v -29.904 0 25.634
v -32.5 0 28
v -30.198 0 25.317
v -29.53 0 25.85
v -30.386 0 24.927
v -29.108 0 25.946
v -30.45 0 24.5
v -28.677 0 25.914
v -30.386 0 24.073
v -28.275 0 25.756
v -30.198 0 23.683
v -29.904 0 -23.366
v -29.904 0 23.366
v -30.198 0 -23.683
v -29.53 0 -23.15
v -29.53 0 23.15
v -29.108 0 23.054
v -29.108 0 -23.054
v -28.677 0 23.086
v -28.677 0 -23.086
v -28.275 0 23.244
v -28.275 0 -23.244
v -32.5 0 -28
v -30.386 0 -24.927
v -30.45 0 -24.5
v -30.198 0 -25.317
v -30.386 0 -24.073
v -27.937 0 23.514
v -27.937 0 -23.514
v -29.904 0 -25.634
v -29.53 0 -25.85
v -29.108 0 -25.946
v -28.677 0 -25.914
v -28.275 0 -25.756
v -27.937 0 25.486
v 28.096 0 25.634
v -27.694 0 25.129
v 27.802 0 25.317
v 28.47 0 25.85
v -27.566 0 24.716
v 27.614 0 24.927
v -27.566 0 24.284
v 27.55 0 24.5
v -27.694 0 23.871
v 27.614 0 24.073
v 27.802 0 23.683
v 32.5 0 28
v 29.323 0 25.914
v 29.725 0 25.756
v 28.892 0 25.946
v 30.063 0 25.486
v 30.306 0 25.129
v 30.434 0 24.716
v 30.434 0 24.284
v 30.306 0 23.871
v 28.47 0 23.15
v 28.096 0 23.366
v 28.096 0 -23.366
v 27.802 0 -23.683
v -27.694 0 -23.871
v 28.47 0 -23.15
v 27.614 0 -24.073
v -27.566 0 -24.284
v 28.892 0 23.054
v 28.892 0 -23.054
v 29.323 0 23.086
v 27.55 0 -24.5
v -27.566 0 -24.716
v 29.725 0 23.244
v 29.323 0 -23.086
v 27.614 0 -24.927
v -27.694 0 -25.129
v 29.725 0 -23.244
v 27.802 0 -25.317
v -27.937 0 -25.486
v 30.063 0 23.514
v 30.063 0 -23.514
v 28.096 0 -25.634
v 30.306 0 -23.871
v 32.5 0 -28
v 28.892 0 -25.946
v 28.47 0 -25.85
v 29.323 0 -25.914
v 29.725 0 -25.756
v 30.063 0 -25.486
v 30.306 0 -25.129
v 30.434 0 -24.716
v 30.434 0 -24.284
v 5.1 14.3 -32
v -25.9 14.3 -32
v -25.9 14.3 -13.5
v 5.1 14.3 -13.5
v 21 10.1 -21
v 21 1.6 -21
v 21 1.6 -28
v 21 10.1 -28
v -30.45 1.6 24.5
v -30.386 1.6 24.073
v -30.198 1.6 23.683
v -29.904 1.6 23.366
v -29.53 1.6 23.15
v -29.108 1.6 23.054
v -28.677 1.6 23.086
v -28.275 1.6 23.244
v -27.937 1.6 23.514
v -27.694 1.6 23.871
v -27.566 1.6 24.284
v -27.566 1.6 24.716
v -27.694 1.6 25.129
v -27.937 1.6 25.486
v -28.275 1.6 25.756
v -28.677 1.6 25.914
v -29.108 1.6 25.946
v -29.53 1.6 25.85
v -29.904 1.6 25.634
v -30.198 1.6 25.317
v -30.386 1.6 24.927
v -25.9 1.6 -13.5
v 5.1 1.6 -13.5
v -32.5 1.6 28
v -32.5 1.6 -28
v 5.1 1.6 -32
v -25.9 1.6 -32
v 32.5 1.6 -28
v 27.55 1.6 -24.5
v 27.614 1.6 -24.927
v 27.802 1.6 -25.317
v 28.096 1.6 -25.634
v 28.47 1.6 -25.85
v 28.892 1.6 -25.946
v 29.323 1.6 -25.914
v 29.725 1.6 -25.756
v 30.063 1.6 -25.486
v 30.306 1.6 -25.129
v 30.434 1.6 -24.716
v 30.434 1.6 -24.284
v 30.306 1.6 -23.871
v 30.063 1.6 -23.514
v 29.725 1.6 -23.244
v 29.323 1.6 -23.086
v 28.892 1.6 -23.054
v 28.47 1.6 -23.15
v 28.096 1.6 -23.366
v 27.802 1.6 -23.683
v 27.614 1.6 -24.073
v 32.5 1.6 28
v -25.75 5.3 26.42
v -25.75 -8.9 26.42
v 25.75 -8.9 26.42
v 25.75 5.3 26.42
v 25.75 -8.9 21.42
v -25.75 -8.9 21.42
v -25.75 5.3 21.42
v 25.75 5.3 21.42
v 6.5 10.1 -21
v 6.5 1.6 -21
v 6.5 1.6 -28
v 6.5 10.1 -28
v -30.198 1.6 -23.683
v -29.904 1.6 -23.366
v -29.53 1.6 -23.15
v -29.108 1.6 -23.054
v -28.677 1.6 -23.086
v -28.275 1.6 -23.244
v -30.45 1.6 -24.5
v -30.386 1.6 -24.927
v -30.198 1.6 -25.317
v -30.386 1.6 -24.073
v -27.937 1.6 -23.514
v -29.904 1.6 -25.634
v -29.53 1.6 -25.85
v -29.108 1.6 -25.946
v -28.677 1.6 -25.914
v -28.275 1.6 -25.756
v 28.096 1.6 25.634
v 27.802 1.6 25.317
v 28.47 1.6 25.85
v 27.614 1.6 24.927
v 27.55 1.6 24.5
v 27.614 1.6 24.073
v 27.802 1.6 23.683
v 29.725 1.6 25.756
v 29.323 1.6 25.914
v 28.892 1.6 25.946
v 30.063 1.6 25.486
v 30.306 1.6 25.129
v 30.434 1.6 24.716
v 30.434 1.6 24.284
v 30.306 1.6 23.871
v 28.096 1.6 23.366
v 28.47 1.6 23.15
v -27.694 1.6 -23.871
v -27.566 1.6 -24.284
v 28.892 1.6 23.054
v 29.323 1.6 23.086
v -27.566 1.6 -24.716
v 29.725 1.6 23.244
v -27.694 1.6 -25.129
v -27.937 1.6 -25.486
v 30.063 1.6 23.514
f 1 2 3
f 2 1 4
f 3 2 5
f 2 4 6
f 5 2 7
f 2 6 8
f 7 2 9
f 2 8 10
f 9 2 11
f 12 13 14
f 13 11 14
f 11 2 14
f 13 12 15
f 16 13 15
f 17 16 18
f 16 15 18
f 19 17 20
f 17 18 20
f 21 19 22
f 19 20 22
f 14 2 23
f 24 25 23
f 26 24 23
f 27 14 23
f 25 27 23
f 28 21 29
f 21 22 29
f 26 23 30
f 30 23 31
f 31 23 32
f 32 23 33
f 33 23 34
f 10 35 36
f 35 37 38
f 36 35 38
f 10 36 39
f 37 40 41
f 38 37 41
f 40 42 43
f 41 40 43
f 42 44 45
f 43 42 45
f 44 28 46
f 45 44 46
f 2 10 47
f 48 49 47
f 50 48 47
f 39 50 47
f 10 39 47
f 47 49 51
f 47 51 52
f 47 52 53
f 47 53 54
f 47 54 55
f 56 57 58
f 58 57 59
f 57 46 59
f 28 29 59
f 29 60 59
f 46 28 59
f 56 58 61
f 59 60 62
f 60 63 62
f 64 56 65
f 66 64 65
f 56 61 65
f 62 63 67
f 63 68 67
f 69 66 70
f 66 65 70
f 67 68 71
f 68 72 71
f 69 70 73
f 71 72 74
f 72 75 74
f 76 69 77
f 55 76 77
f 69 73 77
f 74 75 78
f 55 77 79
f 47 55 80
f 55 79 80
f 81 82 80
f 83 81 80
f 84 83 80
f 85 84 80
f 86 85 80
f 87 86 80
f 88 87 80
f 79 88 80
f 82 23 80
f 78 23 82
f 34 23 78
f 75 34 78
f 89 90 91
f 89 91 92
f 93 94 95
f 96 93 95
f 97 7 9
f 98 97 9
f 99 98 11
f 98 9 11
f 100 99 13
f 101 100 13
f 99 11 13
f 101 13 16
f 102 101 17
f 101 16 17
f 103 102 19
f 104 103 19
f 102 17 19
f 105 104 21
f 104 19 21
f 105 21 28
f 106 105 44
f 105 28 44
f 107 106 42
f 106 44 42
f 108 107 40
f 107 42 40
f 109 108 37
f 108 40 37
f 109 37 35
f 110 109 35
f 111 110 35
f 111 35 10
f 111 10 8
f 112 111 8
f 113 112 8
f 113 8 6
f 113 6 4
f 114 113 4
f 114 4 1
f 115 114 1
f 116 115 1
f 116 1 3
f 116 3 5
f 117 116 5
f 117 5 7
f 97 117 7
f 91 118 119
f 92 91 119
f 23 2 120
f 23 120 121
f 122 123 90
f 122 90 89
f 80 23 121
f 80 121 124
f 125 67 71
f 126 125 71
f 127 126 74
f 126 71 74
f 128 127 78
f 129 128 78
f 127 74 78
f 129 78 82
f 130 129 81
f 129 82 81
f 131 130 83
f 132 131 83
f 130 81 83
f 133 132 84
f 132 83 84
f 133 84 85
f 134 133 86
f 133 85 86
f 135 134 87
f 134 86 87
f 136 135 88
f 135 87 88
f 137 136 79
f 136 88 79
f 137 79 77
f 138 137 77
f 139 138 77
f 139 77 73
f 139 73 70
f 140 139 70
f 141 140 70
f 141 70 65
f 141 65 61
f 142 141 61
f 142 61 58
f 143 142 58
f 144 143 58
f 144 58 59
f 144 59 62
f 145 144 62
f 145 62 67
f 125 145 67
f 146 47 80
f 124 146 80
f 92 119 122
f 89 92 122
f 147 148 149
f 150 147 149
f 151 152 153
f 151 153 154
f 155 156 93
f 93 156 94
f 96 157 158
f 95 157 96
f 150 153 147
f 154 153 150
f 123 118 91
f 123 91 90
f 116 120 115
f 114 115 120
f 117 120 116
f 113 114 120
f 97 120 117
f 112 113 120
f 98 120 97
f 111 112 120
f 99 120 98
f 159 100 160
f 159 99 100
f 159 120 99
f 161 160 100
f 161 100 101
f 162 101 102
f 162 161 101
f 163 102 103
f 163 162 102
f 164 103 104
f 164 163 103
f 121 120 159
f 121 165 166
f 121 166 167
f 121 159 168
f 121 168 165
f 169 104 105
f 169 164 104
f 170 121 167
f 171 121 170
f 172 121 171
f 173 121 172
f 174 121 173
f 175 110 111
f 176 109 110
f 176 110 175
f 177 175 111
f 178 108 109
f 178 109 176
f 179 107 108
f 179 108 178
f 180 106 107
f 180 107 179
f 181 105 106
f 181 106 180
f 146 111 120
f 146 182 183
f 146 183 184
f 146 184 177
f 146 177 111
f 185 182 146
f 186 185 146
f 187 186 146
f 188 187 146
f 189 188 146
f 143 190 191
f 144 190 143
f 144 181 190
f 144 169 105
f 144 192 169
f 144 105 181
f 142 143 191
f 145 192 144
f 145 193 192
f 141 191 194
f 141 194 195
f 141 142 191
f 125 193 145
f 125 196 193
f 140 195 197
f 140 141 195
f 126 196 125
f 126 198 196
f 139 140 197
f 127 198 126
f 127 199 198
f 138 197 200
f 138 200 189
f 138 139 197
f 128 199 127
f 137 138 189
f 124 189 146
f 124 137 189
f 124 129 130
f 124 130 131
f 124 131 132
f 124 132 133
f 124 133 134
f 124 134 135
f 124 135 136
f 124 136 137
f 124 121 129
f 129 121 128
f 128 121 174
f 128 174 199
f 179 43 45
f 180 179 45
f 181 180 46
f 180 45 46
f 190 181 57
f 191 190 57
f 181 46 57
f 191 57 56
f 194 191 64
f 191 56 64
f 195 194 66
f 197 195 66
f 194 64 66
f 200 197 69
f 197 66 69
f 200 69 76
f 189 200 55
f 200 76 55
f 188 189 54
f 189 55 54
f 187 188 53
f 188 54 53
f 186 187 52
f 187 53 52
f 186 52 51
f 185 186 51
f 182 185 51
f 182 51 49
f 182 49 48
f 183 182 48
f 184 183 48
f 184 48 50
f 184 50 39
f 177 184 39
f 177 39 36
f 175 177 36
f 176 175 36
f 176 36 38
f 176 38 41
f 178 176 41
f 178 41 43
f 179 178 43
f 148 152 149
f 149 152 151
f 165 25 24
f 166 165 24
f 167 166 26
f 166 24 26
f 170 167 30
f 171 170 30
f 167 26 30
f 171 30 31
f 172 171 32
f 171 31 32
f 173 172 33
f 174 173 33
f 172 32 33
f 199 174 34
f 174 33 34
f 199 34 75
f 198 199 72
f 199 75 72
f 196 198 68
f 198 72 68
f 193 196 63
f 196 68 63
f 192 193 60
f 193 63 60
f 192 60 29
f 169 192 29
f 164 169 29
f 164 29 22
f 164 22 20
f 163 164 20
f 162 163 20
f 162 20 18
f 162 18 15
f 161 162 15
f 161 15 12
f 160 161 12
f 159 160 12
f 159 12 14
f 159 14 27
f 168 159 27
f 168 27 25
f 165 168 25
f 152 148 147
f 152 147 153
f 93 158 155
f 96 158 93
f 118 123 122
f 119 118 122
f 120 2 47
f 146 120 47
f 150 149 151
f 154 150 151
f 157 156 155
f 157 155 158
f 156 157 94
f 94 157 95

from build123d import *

# Parameters (mm, degrees)
ESQUISSE1_W             = 65
ESQUISSE1_H             = 56
BOSS_EXTRU_1_DEPTH      = 1.6
D_GAGEMENT_M2_51_D      = 2.9
ESQUISSE4_W             = 31
ESQUISSE4_H             = 18.5
BOSS_EXTRU_2_DEPTH      = 12.7
ESQUISSE5_W             = 14.5
ESQUISSE5_H             = 7
BOSS_EXTRU_3_DEPTH      = 8.5
BOSS_EXTRU_4_DEPTH      = 3.7
BOSS_EXTRU_4_DEPTH_BACK = 10.5
ESQUISSE6_W             = 51.5
ESQUISSE6_H             = 5


with BuildPart() as part:
    # Esquisse1 → Boss.-Extru.1 (new body)
    with BuildSketch(Plane(origin=(0, 0, 0), x_dir=(1, 0, 0), z_dir=(0, 1, 0))):
        Rectangle(ESQUISSE1_W, ESQUISSE1_H)
    extrude(amount=BOSS_EXTRU_1_DEPTH)

    # Dégagement M2.51 (through all)
    with Locations(Plane(origin=(0, 1.6, 0), x_dir=(1, 0, 0), z_dir=(0, 1, 0))):
        with Locations((-29, 24.5), (29, 24.5), (29, -24.5), (-29, -24.5)):
            Hole(D_GAGEMENT_M2_51_D / 2)


with BuildPart() as body_2:
    # Esquisse4 → Boss.-Extru.2 (new body)
    with BuildSketch(Plane(origin=(0, 1.6, 0), x_dir=(1, 0, 0), z_dir=(0, 1, 0))):
        with Locations((-10.4, 22.75)):
            Rectangle(ESQUISSE4_W, ESQUISSE4_H)
    extrude(amount=BOSS_EXTRU_2_DEPTH)


with BuildPart() as body_3:
    # Esquisse5 → Boss.-Extru.3 (new body)
    with BuildSketch(Plane(origin=(0, 1.6, 0), x_dir=(1, 0, 0), z_dir=(0, 1, 0))):
        with Locations((13.75, 24.5)):
            Rectangle(ESQUISSE5_W, ESQUISSE5_H)
    extrude(amount=BOSS_EXTRU_3_DEPTH)


with BuildPart() as body_4:
    # Esquisse6 → Boss.-Extru.4 (new, two sides: drawn at the far end of the back side and taken through both)
    with BuildSketch(Plane(origin=(0, 1.6, 0), x_dir=(1, 0, 0), z_dir=(0, 1, 0)).offset(-BOSS_EXTRU_4_DEPTH_BACK)):
        with Locations((0, -23.920055796)):
            Rectangle(ESQUISSE6_W, ESQUISSE6_H)
    extrude(amount=BOSS_EXTRU_4_DEPTH + BOSS_EXTRU_4_DEPTH_BACK)


solid = Compound([part.part, body_2.part, body_3.part, body_4.part])
